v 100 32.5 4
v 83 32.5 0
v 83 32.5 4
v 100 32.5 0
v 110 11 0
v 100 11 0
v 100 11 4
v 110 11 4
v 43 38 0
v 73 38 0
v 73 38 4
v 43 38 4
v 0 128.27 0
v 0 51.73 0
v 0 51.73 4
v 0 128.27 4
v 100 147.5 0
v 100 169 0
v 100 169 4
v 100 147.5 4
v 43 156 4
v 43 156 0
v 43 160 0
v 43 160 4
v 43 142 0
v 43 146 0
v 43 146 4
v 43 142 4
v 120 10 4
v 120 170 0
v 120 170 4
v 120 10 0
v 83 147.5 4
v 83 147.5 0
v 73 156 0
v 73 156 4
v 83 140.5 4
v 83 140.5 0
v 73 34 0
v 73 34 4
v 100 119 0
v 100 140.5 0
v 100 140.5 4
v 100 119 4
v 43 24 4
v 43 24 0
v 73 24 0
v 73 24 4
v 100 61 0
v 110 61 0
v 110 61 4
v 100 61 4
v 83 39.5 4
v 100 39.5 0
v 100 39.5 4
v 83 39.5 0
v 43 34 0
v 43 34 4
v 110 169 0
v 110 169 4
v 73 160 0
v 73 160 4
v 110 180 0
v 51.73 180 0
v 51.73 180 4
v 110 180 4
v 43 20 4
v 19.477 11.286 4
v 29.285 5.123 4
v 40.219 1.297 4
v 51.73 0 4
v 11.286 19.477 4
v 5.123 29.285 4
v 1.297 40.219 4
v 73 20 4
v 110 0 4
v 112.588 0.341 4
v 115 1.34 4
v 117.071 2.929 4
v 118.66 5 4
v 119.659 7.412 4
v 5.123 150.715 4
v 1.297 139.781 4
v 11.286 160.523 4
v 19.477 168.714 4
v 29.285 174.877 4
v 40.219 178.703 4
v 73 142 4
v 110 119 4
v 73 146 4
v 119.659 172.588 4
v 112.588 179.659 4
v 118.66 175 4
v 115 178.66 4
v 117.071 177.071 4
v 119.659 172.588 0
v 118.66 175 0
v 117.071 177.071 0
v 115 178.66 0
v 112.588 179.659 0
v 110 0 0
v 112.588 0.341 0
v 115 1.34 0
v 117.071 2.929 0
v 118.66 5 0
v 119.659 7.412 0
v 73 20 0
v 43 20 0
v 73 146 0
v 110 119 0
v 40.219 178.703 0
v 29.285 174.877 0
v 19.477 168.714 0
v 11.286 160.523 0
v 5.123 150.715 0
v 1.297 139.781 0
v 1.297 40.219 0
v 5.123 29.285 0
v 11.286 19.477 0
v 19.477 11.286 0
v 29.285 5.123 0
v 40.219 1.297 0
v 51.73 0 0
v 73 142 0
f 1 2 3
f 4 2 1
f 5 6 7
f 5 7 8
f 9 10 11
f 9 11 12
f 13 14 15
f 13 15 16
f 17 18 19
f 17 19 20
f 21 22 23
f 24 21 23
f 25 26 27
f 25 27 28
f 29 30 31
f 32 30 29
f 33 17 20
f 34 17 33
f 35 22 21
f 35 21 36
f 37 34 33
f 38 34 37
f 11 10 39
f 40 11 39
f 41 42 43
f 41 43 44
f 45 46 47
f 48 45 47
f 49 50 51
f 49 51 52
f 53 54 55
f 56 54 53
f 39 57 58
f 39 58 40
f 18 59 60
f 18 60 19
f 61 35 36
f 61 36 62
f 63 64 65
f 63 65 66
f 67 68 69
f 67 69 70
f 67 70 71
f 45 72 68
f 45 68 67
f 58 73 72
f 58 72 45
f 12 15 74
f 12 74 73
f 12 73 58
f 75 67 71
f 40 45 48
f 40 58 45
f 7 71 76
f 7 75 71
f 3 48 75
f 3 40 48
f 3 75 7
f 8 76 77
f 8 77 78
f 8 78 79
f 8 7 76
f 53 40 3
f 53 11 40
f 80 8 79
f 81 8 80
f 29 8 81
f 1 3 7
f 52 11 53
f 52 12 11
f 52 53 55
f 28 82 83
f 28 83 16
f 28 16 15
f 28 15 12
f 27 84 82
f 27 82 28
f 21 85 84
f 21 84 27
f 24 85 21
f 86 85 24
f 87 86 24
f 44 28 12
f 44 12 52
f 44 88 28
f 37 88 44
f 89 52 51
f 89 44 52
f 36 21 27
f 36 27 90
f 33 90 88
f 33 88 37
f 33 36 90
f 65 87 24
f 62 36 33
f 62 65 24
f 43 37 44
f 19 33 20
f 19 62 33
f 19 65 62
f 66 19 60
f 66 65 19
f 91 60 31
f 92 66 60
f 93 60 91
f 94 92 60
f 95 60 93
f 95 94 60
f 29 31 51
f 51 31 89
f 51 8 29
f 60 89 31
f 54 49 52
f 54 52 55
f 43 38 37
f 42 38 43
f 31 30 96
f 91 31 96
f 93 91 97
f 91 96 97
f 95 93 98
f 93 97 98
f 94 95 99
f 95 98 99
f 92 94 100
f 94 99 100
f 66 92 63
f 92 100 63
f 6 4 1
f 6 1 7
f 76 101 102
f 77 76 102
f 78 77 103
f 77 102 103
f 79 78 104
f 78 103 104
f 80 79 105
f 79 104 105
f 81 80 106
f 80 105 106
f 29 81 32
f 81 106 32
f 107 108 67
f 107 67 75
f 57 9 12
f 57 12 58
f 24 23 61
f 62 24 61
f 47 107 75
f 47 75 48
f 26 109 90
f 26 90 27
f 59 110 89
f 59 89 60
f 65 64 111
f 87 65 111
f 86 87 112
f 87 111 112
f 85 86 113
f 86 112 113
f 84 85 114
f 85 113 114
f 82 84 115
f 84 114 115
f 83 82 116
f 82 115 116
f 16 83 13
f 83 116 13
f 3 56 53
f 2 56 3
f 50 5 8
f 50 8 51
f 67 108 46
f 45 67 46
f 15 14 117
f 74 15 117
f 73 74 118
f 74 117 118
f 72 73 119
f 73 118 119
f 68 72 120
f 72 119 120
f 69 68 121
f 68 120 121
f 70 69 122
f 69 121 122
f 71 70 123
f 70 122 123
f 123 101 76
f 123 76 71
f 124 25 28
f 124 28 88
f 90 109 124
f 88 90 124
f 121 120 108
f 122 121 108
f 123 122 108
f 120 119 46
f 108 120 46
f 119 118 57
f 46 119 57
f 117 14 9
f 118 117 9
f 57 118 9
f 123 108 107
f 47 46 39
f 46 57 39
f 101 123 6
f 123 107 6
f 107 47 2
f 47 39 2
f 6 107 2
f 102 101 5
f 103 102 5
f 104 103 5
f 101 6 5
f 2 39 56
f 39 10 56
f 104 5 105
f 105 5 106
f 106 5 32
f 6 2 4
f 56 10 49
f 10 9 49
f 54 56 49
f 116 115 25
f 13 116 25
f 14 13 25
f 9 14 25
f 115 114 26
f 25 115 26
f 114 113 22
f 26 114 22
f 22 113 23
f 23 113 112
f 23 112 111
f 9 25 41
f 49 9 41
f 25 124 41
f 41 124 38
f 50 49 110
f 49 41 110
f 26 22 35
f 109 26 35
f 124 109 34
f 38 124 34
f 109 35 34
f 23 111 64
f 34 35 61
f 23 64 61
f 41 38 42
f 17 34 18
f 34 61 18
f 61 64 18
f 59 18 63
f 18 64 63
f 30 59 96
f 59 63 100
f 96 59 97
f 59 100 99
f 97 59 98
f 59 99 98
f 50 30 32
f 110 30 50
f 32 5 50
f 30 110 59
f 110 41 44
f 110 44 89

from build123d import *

# Parameters (mm, degrees)
SKETCH001_W = 30
SKETCH001_H = 4
PAD_DEPTH   = 4


with BuildPart() as part:
    # Sketch001 → Pad (new body)
    with BuildSketch(Plane.XY):
        with BuildLine():
            Line((0, 90), (0, 128.269605))
            ThreePointArc((51.730395, 180), (15.151482, 164.848518), (0, 128.269605))
            Line((51.730395, 180), (110, 180))
            ThreePointArc((120, 170), (117.071068, 177.071068), (110, 180))
            Line((120, 170), (120, 10))
            ThreePointArc((110, 0), (117.071068, 2.928932), (120, 10))
            Line((110, 0), (51.730395, 0))
            ThreePointArc((0, 51.730395), (15.151482, 15.151482), (51.730395, 0))
            Line((0, 51.730395), (0, 90))
        make_face()
        Polygon((100, 61), (100, 39.5), (83, 39.5), (83, 32.5), (100, 32.5), (100, 11), (110, 11), (110, 61), align=None, mode=Mode.SUBTRACT)
        Polygon((100, 119), (110, 119), (110, 169), (100, 169), (100, 147.5), (83, 147.5), (83, 140.5), (100, 140.5), align=None, mode=Mode.SUBTRACT)
        Polygon((73, 38), (43, 38), (43, 34), (73, 34), (73, 36), align=None, mode=Mode.SUBTRACT)
        Polygon((73, 144), (73, 146), (43, 146), (43, 142), (73, 142), align=None, mode=Mode.SUBTRACT)
        with Locations((58, 158)):
            Rectangle(SKETCH001_W, SKETCH001_H, mode=Mode.SUBTRACT)
        with Locations((58, 22)):
            Rectangle(SKETCH001_W, SKETCH001_H, mode=Mode.SUBTRACT)
    extrude(amount=PAD_DEPTH)


solid = part.part
